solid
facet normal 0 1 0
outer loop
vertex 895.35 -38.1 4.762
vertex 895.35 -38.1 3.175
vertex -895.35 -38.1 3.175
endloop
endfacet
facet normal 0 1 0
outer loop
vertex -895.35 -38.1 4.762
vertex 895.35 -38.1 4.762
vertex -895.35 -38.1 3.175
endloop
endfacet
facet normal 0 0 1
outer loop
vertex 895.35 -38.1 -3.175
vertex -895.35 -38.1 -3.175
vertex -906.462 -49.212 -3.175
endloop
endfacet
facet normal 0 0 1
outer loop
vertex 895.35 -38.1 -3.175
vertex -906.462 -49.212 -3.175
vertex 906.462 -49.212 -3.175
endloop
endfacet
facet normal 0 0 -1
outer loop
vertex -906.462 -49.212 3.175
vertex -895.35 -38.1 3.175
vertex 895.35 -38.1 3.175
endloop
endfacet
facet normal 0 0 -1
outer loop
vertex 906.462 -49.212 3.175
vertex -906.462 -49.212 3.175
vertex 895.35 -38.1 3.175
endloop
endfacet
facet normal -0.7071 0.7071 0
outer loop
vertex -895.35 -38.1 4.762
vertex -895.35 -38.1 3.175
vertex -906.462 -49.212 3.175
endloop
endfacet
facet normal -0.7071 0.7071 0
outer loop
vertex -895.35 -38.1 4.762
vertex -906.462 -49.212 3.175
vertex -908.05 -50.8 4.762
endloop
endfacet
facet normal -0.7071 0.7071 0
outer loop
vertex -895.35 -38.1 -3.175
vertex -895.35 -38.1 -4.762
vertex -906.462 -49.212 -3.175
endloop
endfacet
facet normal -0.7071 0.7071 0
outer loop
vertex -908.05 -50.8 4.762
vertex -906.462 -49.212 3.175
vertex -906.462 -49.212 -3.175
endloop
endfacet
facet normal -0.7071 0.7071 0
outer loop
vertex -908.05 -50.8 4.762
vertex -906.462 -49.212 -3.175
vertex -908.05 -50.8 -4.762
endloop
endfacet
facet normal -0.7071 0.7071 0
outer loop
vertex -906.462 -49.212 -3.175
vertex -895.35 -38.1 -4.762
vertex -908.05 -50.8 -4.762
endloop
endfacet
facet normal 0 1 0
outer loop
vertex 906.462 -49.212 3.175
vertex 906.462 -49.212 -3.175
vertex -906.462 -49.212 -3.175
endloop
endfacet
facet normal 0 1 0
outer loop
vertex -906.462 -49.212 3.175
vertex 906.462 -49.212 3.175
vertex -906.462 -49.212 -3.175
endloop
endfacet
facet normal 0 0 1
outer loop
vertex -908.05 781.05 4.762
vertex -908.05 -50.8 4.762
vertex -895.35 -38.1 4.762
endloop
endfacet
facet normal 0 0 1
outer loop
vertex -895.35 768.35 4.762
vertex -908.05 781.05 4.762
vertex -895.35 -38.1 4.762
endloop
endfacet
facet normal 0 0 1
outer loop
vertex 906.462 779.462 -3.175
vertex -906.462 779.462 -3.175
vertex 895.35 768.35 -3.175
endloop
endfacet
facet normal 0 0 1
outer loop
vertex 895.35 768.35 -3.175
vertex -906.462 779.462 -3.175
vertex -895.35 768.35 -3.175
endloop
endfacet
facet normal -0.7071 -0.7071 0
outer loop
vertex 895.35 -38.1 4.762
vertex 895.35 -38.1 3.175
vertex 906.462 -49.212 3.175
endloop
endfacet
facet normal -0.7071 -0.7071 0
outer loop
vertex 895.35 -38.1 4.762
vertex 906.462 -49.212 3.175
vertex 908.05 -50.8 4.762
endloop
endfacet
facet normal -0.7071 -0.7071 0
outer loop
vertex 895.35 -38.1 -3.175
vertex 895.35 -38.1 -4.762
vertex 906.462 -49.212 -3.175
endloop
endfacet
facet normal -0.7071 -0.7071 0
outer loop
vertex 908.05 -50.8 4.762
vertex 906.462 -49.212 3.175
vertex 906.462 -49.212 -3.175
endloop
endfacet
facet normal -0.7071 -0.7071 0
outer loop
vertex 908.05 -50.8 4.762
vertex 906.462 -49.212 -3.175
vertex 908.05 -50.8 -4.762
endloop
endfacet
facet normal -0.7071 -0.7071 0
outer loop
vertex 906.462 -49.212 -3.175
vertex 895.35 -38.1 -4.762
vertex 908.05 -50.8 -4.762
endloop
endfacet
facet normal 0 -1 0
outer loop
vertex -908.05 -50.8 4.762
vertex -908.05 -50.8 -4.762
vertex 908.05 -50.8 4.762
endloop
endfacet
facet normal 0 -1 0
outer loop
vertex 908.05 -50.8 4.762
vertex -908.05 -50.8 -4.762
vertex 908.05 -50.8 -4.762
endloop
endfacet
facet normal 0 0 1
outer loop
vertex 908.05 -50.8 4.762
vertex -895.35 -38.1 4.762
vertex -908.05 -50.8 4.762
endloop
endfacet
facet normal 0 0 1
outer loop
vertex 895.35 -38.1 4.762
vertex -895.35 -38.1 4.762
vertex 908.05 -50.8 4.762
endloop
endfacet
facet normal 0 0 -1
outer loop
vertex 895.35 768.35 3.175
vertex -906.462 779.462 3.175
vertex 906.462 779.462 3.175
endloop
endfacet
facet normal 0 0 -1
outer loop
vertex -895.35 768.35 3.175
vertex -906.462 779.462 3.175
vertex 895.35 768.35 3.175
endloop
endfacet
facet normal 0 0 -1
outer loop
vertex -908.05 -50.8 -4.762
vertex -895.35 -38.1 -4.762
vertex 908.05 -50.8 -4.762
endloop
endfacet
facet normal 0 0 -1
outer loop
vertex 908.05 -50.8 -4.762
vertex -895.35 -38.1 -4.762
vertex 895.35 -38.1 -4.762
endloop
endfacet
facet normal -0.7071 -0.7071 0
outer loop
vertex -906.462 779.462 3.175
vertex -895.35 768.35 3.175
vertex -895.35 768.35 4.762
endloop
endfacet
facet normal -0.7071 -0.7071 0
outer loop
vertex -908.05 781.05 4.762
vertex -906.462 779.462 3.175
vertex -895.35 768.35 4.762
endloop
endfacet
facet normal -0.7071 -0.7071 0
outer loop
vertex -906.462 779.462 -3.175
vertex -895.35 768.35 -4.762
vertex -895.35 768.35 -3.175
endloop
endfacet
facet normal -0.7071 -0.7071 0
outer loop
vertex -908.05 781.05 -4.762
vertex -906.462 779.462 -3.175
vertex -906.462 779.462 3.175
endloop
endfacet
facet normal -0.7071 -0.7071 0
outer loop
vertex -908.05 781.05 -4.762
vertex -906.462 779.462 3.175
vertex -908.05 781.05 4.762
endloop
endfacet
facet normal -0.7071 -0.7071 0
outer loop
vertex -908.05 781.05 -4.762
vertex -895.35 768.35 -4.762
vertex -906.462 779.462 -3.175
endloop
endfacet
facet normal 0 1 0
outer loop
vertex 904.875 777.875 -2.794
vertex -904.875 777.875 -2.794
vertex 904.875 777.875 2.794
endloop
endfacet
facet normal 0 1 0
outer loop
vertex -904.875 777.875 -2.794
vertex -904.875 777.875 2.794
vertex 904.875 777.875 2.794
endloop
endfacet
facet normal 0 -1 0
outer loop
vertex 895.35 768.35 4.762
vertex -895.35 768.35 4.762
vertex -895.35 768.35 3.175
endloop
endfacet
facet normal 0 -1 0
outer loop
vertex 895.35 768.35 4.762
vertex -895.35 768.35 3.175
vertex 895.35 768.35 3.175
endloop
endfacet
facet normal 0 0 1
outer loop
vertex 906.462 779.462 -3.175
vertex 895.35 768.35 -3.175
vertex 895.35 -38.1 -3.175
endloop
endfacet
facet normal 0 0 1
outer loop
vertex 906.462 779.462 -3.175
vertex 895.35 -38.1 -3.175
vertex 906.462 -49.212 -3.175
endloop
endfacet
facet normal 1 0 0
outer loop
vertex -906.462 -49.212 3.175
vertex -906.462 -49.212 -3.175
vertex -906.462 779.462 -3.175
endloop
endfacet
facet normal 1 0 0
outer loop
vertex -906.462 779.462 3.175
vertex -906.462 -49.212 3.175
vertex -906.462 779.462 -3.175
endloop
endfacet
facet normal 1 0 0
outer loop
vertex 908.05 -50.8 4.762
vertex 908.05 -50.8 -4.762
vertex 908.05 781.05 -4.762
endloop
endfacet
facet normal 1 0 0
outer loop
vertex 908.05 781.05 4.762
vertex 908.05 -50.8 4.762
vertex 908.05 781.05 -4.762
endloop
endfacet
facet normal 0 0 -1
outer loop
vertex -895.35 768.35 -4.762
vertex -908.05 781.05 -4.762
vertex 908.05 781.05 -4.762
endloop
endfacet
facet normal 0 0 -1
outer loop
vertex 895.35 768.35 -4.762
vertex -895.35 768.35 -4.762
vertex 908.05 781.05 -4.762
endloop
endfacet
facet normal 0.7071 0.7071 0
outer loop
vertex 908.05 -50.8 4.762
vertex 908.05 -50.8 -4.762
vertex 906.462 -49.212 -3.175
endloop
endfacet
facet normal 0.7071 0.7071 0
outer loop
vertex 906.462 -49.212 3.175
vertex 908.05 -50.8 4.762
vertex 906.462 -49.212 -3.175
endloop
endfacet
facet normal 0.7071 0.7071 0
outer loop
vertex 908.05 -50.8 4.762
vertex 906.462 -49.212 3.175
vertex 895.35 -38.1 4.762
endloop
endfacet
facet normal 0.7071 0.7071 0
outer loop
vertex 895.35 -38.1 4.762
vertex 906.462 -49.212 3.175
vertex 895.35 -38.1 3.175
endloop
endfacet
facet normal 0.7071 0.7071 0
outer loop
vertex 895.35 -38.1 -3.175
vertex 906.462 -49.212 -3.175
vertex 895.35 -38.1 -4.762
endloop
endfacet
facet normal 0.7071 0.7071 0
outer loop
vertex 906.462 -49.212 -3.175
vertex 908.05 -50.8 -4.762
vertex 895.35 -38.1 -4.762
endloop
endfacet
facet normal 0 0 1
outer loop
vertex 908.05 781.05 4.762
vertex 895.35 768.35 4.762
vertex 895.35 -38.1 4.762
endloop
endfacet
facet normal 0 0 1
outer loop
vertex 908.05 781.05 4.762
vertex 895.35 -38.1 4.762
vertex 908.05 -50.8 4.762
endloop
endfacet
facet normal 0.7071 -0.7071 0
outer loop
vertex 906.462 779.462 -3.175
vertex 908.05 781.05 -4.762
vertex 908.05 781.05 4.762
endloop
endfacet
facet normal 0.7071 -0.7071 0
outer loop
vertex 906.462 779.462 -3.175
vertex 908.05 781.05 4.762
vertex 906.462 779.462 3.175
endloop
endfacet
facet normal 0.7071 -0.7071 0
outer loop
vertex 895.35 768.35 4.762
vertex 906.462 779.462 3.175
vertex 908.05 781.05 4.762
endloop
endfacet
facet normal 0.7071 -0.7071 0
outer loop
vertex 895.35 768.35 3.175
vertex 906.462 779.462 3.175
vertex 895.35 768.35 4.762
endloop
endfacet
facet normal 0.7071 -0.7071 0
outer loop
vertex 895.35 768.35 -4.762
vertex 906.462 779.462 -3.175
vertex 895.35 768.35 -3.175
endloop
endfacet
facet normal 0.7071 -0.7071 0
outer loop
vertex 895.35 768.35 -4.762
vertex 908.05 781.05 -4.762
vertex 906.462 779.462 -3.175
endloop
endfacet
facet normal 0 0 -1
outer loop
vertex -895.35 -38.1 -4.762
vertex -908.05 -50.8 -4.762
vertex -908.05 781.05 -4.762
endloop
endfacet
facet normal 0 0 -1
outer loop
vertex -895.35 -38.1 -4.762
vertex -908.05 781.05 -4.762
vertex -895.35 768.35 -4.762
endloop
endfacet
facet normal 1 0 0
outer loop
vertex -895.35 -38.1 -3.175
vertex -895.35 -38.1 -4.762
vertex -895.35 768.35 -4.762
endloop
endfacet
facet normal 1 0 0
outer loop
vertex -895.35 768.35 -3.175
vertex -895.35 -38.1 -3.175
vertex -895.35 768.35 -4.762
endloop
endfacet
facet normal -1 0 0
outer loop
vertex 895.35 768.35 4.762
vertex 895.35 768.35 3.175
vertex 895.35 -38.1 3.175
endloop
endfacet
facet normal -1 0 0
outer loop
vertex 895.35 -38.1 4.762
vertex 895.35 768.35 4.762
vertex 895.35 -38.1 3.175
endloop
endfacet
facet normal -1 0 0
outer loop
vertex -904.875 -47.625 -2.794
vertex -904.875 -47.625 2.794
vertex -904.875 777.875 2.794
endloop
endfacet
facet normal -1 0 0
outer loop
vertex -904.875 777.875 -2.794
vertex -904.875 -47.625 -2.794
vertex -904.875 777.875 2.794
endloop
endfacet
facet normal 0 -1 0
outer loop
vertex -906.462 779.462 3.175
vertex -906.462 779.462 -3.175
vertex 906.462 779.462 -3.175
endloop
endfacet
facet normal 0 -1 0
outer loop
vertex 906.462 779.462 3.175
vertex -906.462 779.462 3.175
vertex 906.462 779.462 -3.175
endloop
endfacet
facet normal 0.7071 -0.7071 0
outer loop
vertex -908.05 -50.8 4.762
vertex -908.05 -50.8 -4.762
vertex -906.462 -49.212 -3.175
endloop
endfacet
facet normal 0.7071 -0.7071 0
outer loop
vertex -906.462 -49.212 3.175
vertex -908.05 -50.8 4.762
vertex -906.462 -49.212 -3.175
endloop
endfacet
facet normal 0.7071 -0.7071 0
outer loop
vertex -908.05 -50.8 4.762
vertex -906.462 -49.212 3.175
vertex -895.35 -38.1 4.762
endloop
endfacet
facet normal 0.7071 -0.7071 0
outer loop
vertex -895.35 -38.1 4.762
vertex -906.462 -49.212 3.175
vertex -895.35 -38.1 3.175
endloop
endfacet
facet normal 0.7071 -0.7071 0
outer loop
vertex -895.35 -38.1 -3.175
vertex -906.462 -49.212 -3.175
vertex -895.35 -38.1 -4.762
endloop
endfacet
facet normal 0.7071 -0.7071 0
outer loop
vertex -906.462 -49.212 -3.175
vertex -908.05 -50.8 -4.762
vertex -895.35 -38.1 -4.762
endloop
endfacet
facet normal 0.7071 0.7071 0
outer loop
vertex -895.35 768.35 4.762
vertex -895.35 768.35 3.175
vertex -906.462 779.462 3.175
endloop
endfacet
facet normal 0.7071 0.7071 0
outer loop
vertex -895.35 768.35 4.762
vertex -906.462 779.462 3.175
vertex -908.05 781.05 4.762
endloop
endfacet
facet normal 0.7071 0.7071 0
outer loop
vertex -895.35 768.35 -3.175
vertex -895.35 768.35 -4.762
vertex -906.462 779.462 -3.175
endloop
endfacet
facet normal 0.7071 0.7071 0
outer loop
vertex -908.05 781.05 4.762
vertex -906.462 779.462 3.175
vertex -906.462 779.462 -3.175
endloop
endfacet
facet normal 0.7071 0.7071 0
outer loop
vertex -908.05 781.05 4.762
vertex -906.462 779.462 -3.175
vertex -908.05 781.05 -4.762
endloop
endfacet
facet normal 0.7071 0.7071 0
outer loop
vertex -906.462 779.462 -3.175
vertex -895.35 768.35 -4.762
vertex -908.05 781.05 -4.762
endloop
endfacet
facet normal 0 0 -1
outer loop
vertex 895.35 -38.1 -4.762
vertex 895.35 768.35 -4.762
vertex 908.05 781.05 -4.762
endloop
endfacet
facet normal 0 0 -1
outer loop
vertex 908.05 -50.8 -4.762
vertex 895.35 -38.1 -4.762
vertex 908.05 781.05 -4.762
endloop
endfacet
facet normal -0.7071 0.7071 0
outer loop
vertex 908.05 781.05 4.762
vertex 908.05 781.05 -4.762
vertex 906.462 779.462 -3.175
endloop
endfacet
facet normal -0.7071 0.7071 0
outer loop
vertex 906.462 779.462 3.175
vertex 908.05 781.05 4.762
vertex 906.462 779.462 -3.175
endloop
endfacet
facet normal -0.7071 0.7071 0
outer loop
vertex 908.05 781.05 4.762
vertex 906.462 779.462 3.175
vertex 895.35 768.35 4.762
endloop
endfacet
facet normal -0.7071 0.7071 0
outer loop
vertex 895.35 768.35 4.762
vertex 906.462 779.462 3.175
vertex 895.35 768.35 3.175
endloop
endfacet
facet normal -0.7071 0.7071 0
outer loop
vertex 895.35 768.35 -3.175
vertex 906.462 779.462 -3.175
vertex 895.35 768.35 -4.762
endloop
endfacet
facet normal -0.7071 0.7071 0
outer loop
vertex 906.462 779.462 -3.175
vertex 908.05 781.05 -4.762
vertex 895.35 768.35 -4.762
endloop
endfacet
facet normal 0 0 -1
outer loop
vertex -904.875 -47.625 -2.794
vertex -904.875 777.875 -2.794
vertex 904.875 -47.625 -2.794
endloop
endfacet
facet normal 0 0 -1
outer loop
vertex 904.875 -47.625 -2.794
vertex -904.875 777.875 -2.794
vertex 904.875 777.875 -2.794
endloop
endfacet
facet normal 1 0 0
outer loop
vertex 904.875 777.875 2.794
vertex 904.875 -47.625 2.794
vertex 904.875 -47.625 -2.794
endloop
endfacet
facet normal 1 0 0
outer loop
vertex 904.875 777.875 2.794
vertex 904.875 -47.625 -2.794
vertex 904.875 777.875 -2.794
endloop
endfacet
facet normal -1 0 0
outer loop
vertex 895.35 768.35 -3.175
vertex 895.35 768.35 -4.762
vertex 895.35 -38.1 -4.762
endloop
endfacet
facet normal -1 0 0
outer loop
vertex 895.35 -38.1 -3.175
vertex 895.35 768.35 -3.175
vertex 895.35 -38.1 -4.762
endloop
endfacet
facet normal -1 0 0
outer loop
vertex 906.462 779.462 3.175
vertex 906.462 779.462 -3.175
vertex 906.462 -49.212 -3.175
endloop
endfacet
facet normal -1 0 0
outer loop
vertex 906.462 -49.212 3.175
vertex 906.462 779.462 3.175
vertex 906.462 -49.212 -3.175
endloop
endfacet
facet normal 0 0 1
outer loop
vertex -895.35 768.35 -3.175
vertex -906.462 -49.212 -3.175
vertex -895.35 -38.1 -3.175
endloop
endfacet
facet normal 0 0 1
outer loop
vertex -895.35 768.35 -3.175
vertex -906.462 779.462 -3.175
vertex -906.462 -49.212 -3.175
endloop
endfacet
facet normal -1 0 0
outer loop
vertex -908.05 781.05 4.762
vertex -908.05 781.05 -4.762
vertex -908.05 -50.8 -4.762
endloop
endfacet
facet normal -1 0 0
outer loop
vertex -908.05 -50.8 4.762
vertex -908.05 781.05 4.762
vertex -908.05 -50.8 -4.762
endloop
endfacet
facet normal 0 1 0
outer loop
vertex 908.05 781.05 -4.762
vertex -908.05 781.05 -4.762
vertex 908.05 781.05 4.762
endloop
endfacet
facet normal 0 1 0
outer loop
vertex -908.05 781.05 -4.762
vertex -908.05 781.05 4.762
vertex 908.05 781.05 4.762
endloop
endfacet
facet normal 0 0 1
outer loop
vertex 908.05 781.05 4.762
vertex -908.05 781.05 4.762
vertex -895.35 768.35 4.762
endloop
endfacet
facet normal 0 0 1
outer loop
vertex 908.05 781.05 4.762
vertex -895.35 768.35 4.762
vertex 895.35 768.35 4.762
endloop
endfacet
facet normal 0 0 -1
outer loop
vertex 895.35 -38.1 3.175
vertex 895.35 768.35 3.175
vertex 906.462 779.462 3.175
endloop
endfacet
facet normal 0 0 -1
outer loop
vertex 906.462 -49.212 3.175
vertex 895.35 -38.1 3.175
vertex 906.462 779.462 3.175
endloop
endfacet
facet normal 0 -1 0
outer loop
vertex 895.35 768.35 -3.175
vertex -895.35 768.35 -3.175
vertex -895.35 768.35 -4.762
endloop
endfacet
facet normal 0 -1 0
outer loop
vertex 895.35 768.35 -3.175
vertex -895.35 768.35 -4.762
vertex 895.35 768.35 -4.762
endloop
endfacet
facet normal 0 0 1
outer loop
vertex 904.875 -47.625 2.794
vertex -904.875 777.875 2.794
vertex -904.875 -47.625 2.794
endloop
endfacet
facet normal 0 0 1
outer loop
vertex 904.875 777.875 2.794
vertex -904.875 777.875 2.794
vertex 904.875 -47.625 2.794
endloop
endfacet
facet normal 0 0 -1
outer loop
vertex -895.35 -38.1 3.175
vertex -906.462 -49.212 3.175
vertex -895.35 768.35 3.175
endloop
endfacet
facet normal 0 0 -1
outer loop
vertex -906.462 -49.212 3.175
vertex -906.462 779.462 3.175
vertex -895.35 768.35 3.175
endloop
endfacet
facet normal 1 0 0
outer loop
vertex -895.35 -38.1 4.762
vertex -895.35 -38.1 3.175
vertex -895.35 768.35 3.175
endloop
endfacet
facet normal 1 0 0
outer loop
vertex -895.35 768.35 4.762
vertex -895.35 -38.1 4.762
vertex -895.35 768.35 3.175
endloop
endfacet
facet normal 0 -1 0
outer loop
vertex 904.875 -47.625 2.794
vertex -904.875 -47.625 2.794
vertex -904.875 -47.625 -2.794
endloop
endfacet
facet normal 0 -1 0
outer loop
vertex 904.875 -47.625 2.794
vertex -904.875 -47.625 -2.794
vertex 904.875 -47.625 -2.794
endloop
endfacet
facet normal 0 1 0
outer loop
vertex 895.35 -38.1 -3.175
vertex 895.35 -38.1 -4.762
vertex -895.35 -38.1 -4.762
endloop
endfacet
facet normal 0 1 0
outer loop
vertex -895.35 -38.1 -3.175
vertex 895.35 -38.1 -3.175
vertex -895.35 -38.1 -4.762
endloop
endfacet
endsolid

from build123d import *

# Parameters (mm, degrees)
SKETCH2_W                     = 1816.1
SKETCH2_H                     = 831.85
FRAME_OUTER_DIMENSIONS_DEPTH  = 4.7625
SKETCH3_W                     = 1790.7
SKETCH3_H                     = 806.45
FRAME_INNER_DIMENSIONS_DEPTH  = 1198.783215204
CUT_EXTRUDE2_DEPTH            = 3.175
CUT_EXTRUDE2_DEPTH_BACK       = 3.175
SKETCH4_W                     = 1812.925
SKETCH4_H                     = 828.675
FRAME_START                   = -4.7625
FRAME_SECTIONS_SPLIT_DEPTH    = 9.525
FRAME_SECTIONS_SPLIT_2_DEPTH  = 1.5875
FRAME_START_2                 = 3.175
FRAME_SECTIONS_SPLIT_3_DEPTH  = 1.5875
FRAME_START_3                 = -3.175
FRAME_SECTIONS_SPLIT_4_DEPTH  = 6.35
FRAME_SECTIONS_SPLIT_5_DEPTH  = 1.5875
FRAME_SECTIONS_SPLIT_6_DEPTH  = 1.5875
FRAME_SECTIONS_SPLIT_7_DEPTH  = 6.35
FRAME_SECTIONS_SPLIT_8_DEPTH  = 1.5875
FRAME_SECTIONS_SPLIT_9_DEPTH  = 1.5875
FRAME_SECTIONS_SPLIT_10_DEPTH = 6.35
SKETCH6_W                     = 1809.75
SKETCH6_H                     = 825.5
DOOR_PANEL_DEPTH              = 2.794


# Read off the part's stored shape, not the designer's step: Frame sections split
with BuildPart() as part:
    # Sketch2 → Frame outer dimensions (new, symmetric)
    with BuildSketch(Plane.XY):
        with Locations((0, 365.125)):
            Rectangle(SKETCH2_W, SKETCH2_H)
    extrude(amount=FRAME_OUTER_DIMENSIONS_DEPTH, both=True)

    # Sketch3 → Frame inner dimensions (cut, through all)
    with BuildSketch(Plane.XY.offset(4.7625)):
        with Locations((0, 365.125)):
            Rectangle(SKETCH3_W, SKETCH3_H)
    extrude(amount=-FRAME_INNER_DIMENSIONS_DEPTH, mode=Mode.SUBTRACT)

    # Sketch4 → Cut-Extrude2 (cut, two sides: drawn at the far end of the back side and taken through both)
    with BuildSketch(Plane.XY.offset(-CUT_EXTRUDE2_DEPTH_BACK)):
        with Locations((0, 365.125)):
            Rectangle(SKETCH4_W, SKETCH4_H)
    extrude(amount=CUT_EXTRUDE2_DEPTH + CUT_EXTRUDE2_DEPTH_BACK, mode=Mode.SUBTRACT)

    # Frame sections split outline → Frame sections split (cut)
    with BuildSketch(Plane.XY.offset(FRAME_START)):
        Polygon((895.35, 768.35), (895.35, -38.1), (-895.35, -38.1), (-895.35, 768.35), (-908.05, 781.05), (-908.05, -50.8), (908.05, -50.8), (908.05, 781.05), align=None)
    extrude(amount=FRAME_SECTIONS_SPLIT_DEPTH, mode=Mode.SUBTRACT)


with BuildPart() as body_2:
    # Frame sections split 2 outline → Frame sections split 2 (new body)
    with BuildSketch(Plane.XY.offset(FRAME_START)):
        Polygon((895.35, 768.35), (895.35, -38.1), (908.05, -50.8), (908.05, 781.05), align=None)
    extrude(amount=FRAME_SECTIONS_SPLIT_2_DEPTH)

    # Frame sections split 3 outline → Frame sections split 3 (add)
    with BuildSketch(Plane.XY.offset(FRAME_START_2)):
        Polygon((895.35, 768.35), (895.35, -38.1), (908.05, -50.8), (908.05, 781.05), align=None)
    extrude(amount=FRAME_SECTIONS_SPLIT_3_DEPTH)

    # Frame sections split 4 outline → Frame sections split 4 (add)
    with BuildSketch(Plane.XY.offset(FRAME_START_3)):
        Polygon((908.05, 781.05), (906.4625, 779.4625), (906.4625, -49.2125), (908.05, -50.8), align=None)
    extrude(amount=FRAME_SECTIONS_SPLIT_4_DEPTH)


with BuildPart() as body_3:
    # Frame sections split 5 outline → Frame sections split 5 (new body)
    with BuildSketch(Plane.XY.offset(FRAME_START)):
        Polygon((-895.35, -38.1), (-895.35, 768.35), (-908.05, 781.05), (-908.05, -50.8), align=None)
    extrude(amount=FRAME_SECTIONS_SPLIT_5_DEPTH)

    # Frame sections split 6 outline → Frame sections split 6 (add)
    with BuildSketch(Plane.XY.offset(FRAME_START_2)):
        Polygon((-895.35, -38.1), (-895.35, 768.35), (-908.05, 781.05), (-908.05, -50.8), align=None)
    extrude(amount=FRAME_SECTIONS_SPLIT_6_DEPTH)

    # Frame sections split 7 outline → Frame sections split 7 (add)
    with BuildSketch(Plane.XY.offset(FRAME_START_3)):
        Polygon((-908.05, -50.8), (-906.4625, -49.2125), (-906.4625, 779.4625), (-908.05, 781.05), align=None)
    extrude(amount=FRAME_SECTIONS_SPLIT_7_DEPTH)


with BuildPart() as body_4:
    # Frame sections split 8 outline → Frame sections split 8 (new body)
    with BuildSketch(Plane.XY.offset(FRAME_START)):
        Polygon((895.35, -38.1), (-895.35, -38.1), (-908.05, -50.8), (908.05, -50.8), align=None)
    extrude(amount=FRAME_SECTIONS_SPLIT_8_DEPTH)

    # Frame sections split 9 outline → Frame sections split 9 (add)
    with BuildSketch(Plane.XY.offset(FRAME_START_2)):
        Polygon((895.35, -38.1), (-895.35, -38.1), (-908.05, -50.8), (908.05, -50.8), align=None)
    extrude(amount=FRAME_SECTIONS_SPLIT_9_DEPTH)

    # Frame sections split 10 outline → Frame sections split 10 (add)
    with BuildSketch(Plane.XY.offset(FRAME_START_3)):
        Polygon((908.05, -50.8), (906.4625, -49.2125), (-906.4625, -49.2125), (-908.05, -50.8), align=None)
    extrude(amount=FRAME_SECTIONS_SPLIT_10_DEPTH)


with BuildPart() as body_5:
    # Sketch6 → Door panel (new, symmetric)
    with BuildSketch(Plane.XY):
        with Locations((0, 365.125)):
            Rectangle(SKETCH6_W, SKETCH6_H)
    extrude(amount=DOOR_PANEL_DEPTH, both=True)


solid = Compound([part.part, body_2.part, body_3.part, body_4.part, body_5.part])
